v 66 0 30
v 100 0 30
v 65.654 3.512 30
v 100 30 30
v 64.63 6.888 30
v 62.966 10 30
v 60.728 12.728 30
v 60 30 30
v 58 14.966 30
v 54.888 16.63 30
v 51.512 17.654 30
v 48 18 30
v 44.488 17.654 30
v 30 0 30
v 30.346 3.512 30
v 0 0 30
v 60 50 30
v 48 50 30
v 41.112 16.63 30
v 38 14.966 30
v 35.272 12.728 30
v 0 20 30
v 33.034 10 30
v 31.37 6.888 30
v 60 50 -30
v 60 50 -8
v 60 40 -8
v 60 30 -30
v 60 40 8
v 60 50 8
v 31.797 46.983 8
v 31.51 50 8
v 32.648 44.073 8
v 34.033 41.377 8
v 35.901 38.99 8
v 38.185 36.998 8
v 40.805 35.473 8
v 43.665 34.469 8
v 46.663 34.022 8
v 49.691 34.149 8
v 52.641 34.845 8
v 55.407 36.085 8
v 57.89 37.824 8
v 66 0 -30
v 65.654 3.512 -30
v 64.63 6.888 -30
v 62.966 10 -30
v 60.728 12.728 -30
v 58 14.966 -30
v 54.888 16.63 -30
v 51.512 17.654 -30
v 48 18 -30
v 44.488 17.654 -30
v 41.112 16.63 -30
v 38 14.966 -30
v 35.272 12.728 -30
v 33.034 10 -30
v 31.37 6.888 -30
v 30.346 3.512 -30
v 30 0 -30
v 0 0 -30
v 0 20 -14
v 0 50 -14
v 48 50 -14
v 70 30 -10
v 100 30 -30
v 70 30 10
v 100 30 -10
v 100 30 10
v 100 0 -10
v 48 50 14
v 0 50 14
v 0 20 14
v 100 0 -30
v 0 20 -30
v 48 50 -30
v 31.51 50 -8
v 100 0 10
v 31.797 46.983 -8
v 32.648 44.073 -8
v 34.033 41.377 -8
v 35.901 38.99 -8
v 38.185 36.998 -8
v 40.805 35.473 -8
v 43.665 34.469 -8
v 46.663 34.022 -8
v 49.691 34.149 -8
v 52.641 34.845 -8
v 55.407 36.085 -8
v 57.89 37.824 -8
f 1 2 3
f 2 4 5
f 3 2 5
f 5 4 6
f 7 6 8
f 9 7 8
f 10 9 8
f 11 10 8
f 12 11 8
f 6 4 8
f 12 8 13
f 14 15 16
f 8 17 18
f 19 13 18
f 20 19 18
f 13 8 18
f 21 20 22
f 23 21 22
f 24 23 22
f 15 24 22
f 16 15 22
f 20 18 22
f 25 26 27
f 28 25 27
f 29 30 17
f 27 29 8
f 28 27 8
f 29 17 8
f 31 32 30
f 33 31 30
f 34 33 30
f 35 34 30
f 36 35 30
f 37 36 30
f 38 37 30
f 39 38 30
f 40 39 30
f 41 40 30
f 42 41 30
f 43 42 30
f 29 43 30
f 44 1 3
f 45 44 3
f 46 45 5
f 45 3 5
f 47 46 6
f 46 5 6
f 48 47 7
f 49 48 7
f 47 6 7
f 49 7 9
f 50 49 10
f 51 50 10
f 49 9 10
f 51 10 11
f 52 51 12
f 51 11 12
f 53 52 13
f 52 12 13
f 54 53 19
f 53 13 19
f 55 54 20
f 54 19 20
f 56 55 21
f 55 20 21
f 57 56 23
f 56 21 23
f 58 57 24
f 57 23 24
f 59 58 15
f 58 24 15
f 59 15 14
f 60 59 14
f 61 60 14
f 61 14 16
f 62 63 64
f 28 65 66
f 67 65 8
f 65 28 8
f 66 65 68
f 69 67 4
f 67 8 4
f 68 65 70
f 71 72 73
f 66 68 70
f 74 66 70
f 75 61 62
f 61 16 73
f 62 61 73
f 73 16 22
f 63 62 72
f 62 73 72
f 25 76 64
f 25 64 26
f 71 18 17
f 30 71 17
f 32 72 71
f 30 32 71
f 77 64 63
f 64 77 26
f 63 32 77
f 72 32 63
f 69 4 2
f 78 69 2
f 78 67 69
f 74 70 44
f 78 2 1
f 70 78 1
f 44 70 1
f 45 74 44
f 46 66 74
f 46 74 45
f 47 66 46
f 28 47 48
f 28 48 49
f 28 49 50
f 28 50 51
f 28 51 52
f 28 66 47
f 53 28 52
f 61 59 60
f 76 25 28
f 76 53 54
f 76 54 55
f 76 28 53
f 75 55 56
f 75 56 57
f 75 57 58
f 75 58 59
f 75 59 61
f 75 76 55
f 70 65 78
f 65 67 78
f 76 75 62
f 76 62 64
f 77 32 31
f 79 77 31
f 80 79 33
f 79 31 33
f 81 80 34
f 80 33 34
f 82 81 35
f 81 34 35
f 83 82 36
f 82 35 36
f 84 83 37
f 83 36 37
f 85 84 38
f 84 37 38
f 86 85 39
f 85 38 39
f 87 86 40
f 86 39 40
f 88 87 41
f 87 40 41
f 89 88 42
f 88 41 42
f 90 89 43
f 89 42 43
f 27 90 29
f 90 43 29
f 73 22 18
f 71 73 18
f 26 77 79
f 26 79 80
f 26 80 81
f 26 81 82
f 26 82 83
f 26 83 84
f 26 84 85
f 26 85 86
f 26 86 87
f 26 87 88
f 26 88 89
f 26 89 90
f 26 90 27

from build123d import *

# Parameters (mm, degrees)
BOSS_EXTRUDE1_DEPTH = 30
CUT_EXTRUDE1_DEPTH  = 16
CUT_EXTRUDE3_DEPTH  = 8
CUT_EXTRUDE4_DEPTH  = 10


with BuildPart() as part:
    # Sketch1 → Boss-Extrude1 (new, symmetric)
    with BuildSketch(Plane.XY):
        with BuildLine():
            Line((0, 0), (0, 20))
            Line((0, 20), (0, 50))
            Line((0, 50), (48, 50))
            Line((48, 50), (60, 50))
            Line((60, 50), (60, 30))
            Line((60, 30), (100, 30))
            Line((100, 30), (100, 0))
            Line((100, 0), (66, 0))
            ThreePointArc((66, 0), (48, 18), (30, 0))
            Line((30, 0), (0, 0))
        make_face()
    extrude(amount=BOSS_EXTRUDE1_DEPTH, both=True)

    # Sketch2 → Cut-Extrude1 (cut)
    with BuildSketch(Plane.XY.offset(30)):
        Polygon((0, 20), (48, 50), (0, 50), align=None)
    cut_extrude1 = extrude(amount=-CUT_EXTRUDE1_DEPTH, mode=Mode.SUBTRACT)

    # Mirror1: Cut-Extrude1 across plane
    add(cut_extrude1.mirror(Plane.XY), mode=Mode.SUBTRACT)

    # Sketch4 → Cut-Extrude3 (cut, symmetric)
    with BuildSketch(Plane.XY):
        with BuildLine():
            Line((60, 50), (31.510004003, 50))
            ThreePointArc((31.510004003, 50), (42.210944462, 34.902981487), (60, 40))
            Line((60, 40), (60, 50))
        make_face()
    extrude(amount=CUT_EXTRUDE3_DEPTH, both=True, mode=Mode.SUBTRACT)

    # Sketch5 → Cut-Extrude4 (cut, symmetric)
    with BuildSketch(Plane.XY):
        Polygon((100, 0), (100, 30), (70, 30), align=None)
    extrude(amount=CUT_EXTRUDE4_DEPTH, both=True, mode=Mode.SUBTRACT)


solid = part.part
